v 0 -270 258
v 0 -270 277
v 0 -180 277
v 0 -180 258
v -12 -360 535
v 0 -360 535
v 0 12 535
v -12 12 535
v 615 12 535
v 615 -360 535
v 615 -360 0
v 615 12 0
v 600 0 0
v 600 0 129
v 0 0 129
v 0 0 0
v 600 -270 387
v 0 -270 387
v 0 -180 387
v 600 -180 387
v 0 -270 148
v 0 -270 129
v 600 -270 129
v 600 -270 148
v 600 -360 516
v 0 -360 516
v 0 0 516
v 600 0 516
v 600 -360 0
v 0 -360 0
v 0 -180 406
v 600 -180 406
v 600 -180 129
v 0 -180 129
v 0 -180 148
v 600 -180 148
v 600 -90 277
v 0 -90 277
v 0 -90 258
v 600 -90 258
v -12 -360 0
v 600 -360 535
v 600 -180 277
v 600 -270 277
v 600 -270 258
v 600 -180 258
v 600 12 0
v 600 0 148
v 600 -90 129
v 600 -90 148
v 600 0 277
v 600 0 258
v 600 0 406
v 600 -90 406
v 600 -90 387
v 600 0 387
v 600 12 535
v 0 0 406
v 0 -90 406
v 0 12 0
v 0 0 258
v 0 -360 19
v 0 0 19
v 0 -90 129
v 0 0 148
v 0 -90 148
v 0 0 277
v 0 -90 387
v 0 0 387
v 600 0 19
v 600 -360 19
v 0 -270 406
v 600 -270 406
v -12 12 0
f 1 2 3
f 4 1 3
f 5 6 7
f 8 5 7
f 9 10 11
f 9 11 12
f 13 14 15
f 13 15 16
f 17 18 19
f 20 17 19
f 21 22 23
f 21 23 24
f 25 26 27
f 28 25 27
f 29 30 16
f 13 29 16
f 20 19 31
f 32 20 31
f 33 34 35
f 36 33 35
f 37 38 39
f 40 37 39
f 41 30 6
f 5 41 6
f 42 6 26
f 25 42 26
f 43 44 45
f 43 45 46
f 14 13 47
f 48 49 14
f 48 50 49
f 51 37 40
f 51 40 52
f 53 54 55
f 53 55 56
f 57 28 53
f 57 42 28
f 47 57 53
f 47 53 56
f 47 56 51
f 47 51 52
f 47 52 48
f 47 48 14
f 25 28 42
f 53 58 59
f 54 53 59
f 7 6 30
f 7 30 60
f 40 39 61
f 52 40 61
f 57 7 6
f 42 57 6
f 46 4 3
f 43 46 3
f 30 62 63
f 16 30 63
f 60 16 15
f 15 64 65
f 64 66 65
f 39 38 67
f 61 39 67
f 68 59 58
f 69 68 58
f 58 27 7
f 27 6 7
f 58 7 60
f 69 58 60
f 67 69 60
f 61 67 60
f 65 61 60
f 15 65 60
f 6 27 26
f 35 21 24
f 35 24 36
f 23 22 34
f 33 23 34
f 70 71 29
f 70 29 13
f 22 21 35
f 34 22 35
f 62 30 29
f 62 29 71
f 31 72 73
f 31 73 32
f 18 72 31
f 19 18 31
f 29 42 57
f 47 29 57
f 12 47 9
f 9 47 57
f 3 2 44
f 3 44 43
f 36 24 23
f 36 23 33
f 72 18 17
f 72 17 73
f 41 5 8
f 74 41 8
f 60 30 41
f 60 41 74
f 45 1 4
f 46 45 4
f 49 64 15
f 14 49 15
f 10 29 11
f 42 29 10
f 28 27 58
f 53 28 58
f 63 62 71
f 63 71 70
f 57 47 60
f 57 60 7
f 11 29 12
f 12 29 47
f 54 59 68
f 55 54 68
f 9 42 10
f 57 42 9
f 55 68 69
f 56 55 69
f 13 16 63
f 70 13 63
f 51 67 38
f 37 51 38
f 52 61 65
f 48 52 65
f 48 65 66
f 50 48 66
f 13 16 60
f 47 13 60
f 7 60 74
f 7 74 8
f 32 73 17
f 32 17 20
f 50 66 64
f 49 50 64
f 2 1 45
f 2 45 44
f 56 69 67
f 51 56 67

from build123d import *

# Parameters (mm, degrees)
F0_W     = 360
F0_H     = 19
F1_DEPTH = 600
F2_W     = 90
F2_H     = 19
F3_DEPTH = 600
F4_W     = 372
F4_H     = 535
F5_DEPTH = 12
F6_W     = 372
F6_H     = 535
F7_DEPTH = 15


with BuildPart() as f1:
    # F0 (on Right) → F1 (new body)
    with BuildSketch(Plane.YZ):
        with Locations((-180, 9.5)):
            Rectangle(F0_W, F0_H)
    extrude(amount=F1_DEPTH)


with BuildPart() as f3:
    # F2 (on Right) → F3 (new body)
    with BuildSketch(Plane.YZ):
        Polygon((-90, 129), (0, 129), (0, 0), (12, 0), (12, 535), (0, 535), (-360, 535), (-360, 516), (0, 516), (0, 406), (-90, 406), (-90, 387), (0, 387), (0, 277), (-90, 277), (-90, 258), (0, 258), (0, 148), (-90, 148), align=None)
        with Locations((-225, 138.5)):
            Rectangle(F2_W, F2_H)
        with Locations((-225, 267.5)):
            Rectangle(F2_W, F2_H)
        with Locations((-225, 396.5)):
            Rectangle(F2_W, F2_H)
    extrude(amount=F3_DEPTH)


with BuildPart() as f5:
    # F4 (on Right) → F5 (new body)
    with BuildSketch(Plane.YZ):
        with Locations((-174, 267.5)):
            Rectangle(F4_W, F4_H)
    extrude(amount=-F5_DEPTH)


with BuildPart() as f7:
    # F6 (on face) → F7 (new body)
    with BuildSketch(Plane.YZ.offset(600)):
        with Locations((-174, 267.5)):
            Rectangle(F6_W, F6_H)
    extrude(amount=F7_DEPTH)


solid = Compound([f1.part, f3.part, f5.part, f7.part])
